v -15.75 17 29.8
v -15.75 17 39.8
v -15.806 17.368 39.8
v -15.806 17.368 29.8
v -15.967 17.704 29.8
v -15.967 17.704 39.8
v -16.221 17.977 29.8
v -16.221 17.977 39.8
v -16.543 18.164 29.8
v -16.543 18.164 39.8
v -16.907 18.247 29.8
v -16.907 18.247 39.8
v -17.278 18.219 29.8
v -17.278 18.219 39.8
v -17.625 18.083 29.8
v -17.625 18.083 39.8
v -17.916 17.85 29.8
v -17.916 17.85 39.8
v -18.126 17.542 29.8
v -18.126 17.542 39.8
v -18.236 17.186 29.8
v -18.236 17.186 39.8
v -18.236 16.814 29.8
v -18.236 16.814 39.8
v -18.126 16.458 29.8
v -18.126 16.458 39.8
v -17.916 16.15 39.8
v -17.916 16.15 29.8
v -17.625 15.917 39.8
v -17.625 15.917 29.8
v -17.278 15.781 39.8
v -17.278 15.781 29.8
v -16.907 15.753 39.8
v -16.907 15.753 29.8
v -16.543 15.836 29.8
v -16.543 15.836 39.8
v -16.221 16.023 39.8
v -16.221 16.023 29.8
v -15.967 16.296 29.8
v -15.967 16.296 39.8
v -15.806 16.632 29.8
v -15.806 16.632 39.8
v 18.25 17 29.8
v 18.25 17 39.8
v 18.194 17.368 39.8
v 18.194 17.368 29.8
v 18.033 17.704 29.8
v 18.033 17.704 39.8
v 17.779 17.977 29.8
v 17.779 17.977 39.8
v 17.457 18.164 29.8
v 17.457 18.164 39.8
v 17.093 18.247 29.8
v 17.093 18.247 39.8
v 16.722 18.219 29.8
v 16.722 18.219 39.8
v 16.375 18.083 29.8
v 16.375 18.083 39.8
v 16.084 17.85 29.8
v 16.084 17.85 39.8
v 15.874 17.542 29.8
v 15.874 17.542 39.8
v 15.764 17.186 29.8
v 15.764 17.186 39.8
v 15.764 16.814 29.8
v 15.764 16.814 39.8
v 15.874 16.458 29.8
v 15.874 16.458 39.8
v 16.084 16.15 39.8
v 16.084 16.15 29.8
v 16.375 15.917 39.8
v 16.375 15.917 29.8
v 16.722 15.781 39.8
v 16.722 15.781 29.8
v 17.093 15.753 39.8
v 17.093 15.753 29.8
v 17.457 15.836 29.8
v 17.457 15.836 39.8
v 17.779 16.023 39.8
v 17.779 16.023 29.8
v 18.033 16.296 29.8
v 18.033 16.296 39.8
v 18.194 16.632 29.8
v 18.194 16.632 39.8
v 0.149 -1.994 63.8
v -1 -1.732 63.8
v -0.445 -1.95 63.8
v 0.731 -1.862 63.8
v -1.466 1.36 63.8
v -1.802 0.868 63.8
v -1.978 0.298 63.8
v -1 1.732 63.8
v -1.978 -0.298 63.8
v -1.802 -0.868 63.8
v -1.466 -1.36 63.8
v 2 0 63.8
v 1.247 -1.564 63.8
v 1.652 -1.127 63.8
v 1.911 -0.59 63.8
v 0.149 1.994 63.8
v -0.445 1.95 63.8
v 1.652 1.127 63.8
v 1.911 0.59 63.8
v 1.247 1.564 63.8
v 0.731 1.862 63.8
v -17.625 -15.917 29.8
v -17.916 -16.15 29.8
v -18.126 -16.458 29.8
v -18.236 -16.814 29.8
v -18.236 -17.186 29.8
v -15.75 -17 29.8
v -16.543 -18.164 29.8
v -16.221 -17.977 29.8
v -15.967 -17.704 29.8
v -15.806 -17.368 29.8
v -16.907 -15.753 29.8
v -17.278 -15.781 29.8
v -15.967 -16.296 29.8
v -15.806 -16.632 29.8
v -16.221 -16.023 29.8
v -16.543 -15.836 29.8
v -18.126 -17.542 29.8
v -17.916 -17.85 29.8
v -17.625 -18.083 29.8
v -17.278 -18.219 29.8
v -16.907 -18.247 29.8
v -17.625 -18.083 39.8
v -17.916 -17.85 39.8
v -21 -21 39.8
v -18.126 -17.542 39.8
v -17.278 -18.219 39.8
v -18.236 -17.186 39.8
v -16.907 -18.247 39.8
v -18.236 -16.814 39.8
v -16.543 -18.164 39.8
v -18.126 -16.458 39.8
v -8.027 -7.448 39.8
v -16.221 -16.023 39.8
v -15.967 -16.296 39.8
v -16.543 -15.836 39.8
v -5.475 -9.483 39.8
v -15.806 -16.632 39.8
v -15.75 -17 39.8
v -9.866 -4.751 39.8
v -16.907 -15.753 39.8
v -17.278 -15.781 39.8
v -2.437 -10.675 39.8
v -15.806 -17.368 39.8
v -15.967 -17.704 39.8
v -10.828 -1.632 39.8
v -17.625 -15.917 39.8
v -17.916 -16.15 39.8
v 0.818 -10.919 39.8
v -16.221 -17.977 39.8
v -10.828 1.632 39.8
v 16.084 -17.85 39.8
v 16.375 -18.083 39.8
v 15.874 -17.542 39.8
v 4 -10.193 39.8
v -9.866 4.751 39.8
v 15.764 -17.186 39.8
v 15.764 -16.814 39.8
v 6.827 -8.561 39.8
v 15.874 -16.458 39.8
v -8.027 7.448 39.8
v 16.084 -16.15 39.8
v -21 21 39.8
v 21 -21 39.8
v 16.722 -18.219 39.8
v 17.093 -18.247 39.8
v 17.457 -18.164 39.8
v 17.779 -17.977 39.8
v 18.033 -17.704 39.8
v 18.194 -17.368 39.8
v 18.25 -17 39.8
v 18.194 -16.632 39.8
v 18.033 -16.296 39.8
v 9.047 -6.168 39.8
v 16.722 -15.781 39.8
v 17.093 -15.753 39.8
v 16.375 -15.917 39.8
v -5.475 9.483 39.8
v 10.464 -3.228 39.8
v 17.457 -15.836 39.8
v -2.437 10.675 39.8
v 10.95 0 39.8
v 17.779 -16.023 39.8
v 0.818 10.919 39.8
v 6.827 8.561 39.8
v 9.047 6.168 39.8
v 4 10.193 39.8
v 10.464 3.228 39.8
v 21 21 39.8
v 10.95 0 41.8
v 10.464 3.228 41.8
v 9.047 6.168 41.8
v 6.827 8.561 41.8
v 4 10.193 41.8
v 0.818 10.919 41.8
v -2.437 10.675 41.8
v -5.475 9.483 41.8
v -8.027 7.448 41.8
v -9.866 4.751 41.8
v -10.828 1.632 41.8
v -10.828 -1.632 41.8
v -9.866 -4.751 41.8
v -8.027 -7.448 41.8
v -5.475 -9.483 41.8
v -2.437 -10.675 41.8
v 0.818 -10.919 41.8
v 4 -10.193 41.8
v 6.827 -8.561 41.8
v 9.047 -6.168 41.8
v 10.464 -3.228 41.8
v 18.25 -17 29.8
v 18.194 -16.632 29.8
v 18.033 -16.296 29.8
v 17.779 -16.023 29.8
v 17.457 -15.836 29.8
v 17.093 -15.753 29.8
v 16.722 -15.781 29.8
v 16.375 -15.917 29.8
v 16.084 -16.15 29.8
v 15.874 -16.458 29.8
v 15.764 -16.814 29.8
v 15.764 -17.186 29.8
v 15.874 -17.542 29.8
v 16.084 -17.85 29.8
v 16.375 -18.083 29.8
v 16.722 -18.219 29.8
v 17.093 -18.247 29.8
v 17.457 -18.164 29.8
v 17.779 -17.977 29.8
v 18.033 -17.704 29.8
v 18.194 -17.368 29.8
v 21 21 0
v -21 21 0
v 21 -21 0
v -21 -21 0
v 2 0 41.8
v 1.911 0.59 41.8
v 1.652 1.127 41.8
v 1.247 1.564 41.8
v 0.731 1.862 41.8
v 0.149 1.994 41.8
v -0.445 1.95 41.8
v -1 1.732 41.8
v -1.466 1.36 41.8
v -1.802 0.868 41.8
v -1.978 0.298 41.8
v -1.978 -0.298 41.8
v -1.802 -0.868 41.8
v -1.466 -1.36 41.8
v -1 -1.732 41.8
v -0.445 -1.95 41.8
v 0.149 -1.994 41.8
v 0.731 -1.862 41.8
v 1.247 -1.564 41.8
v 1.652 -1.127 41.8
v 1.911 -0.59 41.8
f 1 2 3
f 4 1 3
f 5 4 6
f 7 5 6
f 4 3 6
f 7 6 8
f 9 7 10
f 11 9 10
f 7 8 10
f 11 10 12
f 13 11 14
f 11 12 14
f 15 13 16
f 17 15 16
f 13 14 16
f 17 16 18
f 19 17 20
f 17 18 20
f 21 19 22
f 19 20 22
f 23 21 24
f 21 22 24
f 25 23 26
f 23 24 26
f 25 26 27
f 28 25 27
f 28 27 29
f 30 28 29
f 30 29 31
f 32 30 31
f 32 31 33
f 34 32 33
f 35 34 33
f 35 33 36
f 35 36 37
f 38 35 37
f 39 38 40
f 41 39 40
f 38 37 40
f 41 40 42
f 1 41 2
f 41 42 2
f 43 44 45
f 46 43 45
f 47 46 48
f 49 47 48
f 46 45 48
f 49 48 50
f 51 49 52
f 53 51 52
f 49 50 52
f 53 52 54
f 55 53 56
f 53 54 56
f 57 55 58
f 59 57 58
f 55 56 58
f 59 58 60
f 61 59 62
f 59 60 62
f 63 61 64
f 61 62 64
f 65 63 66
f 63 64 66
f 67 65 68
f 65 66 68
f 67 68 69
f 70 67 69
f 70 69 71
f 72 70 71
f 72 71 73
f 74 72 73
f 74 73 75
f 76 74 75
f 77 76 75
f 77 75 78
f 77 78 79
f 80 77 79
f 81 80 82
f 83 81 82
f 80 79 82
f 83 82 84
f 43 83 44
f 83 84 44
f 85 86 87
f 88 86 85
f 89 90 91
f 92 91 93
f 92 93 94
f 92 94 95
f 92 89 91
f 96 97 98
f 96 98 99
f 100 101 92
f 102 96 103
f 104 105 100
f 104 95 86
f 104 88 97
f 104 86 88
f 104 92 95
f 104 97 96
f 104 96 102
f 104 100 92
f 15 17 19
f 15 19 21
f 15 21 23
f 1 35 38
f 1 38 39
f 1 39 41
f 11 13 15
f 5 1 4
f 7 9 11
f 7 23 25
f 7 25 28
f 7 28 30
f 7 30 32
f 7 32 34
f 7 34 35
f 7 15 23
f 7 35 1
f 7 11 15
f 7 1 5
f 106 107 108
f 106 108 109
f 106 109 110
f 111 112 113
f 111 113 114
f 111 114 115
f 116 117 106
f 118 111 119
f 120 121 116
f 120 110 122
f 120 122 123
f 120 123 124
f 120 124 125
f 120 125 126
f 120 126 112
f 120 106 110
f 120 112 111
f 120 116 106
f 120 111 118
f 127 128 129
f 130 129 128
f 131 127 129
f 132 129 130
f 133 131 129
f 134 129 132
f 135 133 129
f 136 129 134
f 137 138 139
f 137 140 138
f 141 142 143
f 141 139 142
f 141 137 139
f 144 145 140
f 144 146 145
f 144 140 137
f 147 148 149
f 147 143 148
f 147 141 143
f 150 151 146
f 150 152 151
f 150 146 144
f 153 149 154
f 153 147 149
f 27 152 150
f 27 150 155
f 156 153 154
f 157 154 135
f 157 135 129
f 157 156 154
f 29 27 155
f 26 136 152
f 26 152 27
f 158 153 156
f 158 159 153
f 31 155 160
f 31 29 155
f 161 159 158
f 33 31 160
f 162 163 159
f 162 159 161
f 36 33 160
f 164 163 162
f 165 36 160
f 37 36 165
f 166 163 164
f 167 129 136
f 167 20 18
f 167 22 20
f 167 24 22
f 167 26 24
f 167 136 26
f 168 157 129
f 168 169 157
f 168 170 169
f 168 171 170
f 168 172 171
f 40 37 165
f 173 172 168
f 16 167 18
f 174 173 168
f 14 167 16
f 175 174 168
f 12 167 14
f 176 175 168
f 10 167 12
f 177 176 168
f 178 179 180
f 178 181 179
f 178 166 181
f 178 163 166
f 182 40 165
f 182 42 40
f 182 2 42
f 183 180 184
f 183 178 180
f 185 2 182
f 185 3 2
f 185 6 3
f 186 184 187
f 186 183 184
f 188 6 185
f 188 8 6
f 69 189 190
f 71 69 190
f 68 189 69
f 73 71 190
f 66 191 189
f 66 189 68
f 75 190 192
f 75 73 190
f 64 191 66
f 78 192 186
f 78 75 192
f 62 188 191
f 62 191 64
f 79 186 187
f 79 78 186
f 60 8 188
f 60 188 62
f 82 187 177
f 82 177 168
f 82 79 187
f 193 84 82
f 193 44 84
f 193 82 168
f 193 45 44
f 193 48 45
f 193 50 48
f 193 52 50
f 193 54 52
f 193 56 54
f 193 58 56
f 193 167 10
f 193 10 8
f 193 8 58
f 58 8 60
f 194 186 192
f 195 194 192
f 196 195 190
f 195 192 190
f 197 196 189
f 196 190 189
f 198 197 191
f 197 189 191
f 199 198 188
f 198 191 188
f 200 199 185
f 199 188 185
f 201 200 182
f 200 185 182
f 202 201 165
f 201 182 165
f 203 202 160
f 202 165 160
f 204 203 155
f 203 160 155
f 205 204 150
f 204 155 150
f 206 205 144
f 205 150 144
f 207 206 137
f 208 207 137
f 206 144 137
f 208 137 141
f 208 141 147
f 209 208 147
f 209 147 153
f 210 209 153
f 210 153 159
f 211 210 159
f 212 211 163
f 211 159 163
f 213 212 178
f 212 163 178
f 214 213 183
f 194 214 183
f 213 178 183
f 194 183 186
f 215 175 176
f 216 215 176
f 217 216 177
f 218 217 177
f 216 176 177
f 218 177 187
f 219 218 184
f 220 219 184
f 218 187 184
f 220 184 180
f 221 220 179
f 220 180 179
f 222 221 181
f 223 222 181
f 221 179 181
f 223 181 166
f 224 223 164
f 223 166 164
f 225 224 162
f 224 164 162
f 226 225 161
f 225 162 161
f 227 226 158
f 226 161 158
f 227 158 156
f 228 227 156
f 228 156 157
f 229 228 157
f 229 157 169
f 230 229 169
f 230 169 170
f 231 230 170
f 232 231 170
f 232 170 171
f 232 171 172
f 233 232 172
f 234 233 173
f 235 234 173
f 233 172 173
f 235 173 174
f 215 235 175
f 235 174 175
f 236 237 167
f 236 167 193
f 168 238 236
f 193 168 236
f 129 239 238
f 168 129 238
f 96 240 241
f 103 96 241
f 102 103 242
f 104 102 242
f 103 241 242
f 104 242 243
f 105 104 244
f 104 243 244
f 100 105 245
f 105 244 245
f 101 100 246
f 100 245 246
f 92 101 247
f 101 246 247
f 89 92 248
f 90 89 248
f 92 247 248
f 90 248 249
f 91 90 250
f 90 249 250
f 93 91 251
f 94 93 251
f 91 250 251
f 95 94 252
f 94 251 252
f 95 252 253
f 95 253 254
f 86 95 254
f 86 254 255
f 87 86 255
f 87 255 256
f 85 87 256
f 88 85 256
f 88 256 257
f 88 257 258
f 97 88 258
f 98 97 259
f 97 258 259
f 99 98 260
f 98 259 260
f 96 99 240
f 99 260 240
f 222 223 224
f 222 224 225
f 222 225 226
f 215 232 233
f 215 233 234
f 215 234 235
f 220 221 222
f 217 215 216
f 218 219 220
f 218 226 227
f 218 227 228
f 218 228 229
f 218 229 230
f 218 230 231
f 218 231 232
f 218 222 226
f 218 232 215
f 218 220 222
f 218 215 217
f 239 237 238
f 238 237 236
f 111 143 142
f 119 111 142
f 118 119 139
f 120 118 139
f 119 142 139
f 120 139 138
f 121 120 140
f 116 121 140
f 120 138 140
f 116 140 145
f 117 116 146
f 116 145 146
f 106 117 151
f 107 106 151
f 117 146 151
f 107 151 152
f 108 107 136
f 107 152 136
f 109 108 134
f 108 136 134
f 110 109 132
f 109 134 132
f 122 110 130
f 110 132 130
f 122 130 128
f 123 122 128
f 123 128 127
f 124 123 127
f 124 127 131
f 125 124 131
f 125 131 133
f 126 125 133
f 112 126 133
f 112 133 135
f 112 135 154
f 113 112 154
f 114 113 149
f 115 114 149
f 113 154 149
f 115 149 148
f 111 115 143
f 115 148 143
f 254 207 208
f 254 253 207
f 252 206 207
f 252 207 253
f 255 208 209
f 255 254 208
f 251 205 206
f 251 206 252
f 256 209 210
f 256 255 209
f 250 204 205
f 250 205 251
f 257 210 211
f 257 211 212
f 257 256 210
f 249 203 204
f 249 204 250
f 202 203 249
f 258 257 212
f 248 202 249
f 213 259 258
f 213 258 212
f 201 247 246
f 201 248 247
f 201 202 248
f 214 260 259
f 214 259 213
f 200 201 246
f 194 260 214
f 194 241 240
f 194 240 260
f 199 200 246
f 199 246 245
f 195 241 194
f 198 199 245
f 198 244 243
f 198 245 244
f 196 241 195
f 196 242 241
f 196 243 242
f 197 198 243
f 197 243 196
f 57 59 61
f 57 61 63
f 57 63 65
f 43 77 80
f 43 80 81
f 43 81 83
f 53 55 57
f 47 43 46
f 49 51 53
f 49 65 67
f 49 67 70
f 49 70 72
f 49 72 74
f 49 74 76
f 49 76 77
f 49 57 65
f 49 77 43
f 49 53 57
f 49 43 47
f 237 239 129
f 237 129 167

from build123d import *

# Parameters (mm, degrees)
SKETCH1_W           = 42
SKETCH1_H           = 42
BOSS_EXTRUDE1_DEPTH = 39.8
SKETCH2_R           = 10.95
BOSS_EXTRUDE2_DEPTH = 2
SKETCH3_R           = 1.25
CUT_EXTRUDE1_DEPTH  = 10
SKETCH4_R           = 2
BOSS_EXTRUDE3_DEPTH = 22


with BuildPart() as part:
    # Sketch1 → Boss-Extrude1 (new body)
    with BuildSketch(Plane.XY):
        Rectangle(SKETCH1_W, SKETCH1_H)
    extrude(amount=BOSS_EXTRUDE1_DEPTH)

    # Sketch2 → Boss-Extrude2 (add)
    with BuildSketch(Plane.XY.offset(39.8)):
        Circle(SKETCH2_R)
    extrude(amount=BOSS_EXTRUDE2_DEPTH)

    # Sketch3 → Cut-Extrude1 (cut)
    with BuildSketch(Plane.XY.offset(39.8)):
        with Locations((-17, 17)):
            Circle(SKETCH3_R)
        with Locations((17, 17)):
            Circle(SKETCH3_R)
        with Locations((17, -17)):
            Circle(SKETCH3_R)
        with Locations((-17, -17)):
            Circle(SKETCH3_R)
    extrude(amount=-CUT_EXTRUDE1_DEPTH, mode=Mode.SUBTRACT)

    # Sketch4 → Boss-Extrude3 (add)
    with BuildSketch(Plane.XY.offset(41.8)):
        Circle(SKETCH4_R)
    extrude(amount=BOSS_EXTRUDE3_DEPTH)


solid = part.part
